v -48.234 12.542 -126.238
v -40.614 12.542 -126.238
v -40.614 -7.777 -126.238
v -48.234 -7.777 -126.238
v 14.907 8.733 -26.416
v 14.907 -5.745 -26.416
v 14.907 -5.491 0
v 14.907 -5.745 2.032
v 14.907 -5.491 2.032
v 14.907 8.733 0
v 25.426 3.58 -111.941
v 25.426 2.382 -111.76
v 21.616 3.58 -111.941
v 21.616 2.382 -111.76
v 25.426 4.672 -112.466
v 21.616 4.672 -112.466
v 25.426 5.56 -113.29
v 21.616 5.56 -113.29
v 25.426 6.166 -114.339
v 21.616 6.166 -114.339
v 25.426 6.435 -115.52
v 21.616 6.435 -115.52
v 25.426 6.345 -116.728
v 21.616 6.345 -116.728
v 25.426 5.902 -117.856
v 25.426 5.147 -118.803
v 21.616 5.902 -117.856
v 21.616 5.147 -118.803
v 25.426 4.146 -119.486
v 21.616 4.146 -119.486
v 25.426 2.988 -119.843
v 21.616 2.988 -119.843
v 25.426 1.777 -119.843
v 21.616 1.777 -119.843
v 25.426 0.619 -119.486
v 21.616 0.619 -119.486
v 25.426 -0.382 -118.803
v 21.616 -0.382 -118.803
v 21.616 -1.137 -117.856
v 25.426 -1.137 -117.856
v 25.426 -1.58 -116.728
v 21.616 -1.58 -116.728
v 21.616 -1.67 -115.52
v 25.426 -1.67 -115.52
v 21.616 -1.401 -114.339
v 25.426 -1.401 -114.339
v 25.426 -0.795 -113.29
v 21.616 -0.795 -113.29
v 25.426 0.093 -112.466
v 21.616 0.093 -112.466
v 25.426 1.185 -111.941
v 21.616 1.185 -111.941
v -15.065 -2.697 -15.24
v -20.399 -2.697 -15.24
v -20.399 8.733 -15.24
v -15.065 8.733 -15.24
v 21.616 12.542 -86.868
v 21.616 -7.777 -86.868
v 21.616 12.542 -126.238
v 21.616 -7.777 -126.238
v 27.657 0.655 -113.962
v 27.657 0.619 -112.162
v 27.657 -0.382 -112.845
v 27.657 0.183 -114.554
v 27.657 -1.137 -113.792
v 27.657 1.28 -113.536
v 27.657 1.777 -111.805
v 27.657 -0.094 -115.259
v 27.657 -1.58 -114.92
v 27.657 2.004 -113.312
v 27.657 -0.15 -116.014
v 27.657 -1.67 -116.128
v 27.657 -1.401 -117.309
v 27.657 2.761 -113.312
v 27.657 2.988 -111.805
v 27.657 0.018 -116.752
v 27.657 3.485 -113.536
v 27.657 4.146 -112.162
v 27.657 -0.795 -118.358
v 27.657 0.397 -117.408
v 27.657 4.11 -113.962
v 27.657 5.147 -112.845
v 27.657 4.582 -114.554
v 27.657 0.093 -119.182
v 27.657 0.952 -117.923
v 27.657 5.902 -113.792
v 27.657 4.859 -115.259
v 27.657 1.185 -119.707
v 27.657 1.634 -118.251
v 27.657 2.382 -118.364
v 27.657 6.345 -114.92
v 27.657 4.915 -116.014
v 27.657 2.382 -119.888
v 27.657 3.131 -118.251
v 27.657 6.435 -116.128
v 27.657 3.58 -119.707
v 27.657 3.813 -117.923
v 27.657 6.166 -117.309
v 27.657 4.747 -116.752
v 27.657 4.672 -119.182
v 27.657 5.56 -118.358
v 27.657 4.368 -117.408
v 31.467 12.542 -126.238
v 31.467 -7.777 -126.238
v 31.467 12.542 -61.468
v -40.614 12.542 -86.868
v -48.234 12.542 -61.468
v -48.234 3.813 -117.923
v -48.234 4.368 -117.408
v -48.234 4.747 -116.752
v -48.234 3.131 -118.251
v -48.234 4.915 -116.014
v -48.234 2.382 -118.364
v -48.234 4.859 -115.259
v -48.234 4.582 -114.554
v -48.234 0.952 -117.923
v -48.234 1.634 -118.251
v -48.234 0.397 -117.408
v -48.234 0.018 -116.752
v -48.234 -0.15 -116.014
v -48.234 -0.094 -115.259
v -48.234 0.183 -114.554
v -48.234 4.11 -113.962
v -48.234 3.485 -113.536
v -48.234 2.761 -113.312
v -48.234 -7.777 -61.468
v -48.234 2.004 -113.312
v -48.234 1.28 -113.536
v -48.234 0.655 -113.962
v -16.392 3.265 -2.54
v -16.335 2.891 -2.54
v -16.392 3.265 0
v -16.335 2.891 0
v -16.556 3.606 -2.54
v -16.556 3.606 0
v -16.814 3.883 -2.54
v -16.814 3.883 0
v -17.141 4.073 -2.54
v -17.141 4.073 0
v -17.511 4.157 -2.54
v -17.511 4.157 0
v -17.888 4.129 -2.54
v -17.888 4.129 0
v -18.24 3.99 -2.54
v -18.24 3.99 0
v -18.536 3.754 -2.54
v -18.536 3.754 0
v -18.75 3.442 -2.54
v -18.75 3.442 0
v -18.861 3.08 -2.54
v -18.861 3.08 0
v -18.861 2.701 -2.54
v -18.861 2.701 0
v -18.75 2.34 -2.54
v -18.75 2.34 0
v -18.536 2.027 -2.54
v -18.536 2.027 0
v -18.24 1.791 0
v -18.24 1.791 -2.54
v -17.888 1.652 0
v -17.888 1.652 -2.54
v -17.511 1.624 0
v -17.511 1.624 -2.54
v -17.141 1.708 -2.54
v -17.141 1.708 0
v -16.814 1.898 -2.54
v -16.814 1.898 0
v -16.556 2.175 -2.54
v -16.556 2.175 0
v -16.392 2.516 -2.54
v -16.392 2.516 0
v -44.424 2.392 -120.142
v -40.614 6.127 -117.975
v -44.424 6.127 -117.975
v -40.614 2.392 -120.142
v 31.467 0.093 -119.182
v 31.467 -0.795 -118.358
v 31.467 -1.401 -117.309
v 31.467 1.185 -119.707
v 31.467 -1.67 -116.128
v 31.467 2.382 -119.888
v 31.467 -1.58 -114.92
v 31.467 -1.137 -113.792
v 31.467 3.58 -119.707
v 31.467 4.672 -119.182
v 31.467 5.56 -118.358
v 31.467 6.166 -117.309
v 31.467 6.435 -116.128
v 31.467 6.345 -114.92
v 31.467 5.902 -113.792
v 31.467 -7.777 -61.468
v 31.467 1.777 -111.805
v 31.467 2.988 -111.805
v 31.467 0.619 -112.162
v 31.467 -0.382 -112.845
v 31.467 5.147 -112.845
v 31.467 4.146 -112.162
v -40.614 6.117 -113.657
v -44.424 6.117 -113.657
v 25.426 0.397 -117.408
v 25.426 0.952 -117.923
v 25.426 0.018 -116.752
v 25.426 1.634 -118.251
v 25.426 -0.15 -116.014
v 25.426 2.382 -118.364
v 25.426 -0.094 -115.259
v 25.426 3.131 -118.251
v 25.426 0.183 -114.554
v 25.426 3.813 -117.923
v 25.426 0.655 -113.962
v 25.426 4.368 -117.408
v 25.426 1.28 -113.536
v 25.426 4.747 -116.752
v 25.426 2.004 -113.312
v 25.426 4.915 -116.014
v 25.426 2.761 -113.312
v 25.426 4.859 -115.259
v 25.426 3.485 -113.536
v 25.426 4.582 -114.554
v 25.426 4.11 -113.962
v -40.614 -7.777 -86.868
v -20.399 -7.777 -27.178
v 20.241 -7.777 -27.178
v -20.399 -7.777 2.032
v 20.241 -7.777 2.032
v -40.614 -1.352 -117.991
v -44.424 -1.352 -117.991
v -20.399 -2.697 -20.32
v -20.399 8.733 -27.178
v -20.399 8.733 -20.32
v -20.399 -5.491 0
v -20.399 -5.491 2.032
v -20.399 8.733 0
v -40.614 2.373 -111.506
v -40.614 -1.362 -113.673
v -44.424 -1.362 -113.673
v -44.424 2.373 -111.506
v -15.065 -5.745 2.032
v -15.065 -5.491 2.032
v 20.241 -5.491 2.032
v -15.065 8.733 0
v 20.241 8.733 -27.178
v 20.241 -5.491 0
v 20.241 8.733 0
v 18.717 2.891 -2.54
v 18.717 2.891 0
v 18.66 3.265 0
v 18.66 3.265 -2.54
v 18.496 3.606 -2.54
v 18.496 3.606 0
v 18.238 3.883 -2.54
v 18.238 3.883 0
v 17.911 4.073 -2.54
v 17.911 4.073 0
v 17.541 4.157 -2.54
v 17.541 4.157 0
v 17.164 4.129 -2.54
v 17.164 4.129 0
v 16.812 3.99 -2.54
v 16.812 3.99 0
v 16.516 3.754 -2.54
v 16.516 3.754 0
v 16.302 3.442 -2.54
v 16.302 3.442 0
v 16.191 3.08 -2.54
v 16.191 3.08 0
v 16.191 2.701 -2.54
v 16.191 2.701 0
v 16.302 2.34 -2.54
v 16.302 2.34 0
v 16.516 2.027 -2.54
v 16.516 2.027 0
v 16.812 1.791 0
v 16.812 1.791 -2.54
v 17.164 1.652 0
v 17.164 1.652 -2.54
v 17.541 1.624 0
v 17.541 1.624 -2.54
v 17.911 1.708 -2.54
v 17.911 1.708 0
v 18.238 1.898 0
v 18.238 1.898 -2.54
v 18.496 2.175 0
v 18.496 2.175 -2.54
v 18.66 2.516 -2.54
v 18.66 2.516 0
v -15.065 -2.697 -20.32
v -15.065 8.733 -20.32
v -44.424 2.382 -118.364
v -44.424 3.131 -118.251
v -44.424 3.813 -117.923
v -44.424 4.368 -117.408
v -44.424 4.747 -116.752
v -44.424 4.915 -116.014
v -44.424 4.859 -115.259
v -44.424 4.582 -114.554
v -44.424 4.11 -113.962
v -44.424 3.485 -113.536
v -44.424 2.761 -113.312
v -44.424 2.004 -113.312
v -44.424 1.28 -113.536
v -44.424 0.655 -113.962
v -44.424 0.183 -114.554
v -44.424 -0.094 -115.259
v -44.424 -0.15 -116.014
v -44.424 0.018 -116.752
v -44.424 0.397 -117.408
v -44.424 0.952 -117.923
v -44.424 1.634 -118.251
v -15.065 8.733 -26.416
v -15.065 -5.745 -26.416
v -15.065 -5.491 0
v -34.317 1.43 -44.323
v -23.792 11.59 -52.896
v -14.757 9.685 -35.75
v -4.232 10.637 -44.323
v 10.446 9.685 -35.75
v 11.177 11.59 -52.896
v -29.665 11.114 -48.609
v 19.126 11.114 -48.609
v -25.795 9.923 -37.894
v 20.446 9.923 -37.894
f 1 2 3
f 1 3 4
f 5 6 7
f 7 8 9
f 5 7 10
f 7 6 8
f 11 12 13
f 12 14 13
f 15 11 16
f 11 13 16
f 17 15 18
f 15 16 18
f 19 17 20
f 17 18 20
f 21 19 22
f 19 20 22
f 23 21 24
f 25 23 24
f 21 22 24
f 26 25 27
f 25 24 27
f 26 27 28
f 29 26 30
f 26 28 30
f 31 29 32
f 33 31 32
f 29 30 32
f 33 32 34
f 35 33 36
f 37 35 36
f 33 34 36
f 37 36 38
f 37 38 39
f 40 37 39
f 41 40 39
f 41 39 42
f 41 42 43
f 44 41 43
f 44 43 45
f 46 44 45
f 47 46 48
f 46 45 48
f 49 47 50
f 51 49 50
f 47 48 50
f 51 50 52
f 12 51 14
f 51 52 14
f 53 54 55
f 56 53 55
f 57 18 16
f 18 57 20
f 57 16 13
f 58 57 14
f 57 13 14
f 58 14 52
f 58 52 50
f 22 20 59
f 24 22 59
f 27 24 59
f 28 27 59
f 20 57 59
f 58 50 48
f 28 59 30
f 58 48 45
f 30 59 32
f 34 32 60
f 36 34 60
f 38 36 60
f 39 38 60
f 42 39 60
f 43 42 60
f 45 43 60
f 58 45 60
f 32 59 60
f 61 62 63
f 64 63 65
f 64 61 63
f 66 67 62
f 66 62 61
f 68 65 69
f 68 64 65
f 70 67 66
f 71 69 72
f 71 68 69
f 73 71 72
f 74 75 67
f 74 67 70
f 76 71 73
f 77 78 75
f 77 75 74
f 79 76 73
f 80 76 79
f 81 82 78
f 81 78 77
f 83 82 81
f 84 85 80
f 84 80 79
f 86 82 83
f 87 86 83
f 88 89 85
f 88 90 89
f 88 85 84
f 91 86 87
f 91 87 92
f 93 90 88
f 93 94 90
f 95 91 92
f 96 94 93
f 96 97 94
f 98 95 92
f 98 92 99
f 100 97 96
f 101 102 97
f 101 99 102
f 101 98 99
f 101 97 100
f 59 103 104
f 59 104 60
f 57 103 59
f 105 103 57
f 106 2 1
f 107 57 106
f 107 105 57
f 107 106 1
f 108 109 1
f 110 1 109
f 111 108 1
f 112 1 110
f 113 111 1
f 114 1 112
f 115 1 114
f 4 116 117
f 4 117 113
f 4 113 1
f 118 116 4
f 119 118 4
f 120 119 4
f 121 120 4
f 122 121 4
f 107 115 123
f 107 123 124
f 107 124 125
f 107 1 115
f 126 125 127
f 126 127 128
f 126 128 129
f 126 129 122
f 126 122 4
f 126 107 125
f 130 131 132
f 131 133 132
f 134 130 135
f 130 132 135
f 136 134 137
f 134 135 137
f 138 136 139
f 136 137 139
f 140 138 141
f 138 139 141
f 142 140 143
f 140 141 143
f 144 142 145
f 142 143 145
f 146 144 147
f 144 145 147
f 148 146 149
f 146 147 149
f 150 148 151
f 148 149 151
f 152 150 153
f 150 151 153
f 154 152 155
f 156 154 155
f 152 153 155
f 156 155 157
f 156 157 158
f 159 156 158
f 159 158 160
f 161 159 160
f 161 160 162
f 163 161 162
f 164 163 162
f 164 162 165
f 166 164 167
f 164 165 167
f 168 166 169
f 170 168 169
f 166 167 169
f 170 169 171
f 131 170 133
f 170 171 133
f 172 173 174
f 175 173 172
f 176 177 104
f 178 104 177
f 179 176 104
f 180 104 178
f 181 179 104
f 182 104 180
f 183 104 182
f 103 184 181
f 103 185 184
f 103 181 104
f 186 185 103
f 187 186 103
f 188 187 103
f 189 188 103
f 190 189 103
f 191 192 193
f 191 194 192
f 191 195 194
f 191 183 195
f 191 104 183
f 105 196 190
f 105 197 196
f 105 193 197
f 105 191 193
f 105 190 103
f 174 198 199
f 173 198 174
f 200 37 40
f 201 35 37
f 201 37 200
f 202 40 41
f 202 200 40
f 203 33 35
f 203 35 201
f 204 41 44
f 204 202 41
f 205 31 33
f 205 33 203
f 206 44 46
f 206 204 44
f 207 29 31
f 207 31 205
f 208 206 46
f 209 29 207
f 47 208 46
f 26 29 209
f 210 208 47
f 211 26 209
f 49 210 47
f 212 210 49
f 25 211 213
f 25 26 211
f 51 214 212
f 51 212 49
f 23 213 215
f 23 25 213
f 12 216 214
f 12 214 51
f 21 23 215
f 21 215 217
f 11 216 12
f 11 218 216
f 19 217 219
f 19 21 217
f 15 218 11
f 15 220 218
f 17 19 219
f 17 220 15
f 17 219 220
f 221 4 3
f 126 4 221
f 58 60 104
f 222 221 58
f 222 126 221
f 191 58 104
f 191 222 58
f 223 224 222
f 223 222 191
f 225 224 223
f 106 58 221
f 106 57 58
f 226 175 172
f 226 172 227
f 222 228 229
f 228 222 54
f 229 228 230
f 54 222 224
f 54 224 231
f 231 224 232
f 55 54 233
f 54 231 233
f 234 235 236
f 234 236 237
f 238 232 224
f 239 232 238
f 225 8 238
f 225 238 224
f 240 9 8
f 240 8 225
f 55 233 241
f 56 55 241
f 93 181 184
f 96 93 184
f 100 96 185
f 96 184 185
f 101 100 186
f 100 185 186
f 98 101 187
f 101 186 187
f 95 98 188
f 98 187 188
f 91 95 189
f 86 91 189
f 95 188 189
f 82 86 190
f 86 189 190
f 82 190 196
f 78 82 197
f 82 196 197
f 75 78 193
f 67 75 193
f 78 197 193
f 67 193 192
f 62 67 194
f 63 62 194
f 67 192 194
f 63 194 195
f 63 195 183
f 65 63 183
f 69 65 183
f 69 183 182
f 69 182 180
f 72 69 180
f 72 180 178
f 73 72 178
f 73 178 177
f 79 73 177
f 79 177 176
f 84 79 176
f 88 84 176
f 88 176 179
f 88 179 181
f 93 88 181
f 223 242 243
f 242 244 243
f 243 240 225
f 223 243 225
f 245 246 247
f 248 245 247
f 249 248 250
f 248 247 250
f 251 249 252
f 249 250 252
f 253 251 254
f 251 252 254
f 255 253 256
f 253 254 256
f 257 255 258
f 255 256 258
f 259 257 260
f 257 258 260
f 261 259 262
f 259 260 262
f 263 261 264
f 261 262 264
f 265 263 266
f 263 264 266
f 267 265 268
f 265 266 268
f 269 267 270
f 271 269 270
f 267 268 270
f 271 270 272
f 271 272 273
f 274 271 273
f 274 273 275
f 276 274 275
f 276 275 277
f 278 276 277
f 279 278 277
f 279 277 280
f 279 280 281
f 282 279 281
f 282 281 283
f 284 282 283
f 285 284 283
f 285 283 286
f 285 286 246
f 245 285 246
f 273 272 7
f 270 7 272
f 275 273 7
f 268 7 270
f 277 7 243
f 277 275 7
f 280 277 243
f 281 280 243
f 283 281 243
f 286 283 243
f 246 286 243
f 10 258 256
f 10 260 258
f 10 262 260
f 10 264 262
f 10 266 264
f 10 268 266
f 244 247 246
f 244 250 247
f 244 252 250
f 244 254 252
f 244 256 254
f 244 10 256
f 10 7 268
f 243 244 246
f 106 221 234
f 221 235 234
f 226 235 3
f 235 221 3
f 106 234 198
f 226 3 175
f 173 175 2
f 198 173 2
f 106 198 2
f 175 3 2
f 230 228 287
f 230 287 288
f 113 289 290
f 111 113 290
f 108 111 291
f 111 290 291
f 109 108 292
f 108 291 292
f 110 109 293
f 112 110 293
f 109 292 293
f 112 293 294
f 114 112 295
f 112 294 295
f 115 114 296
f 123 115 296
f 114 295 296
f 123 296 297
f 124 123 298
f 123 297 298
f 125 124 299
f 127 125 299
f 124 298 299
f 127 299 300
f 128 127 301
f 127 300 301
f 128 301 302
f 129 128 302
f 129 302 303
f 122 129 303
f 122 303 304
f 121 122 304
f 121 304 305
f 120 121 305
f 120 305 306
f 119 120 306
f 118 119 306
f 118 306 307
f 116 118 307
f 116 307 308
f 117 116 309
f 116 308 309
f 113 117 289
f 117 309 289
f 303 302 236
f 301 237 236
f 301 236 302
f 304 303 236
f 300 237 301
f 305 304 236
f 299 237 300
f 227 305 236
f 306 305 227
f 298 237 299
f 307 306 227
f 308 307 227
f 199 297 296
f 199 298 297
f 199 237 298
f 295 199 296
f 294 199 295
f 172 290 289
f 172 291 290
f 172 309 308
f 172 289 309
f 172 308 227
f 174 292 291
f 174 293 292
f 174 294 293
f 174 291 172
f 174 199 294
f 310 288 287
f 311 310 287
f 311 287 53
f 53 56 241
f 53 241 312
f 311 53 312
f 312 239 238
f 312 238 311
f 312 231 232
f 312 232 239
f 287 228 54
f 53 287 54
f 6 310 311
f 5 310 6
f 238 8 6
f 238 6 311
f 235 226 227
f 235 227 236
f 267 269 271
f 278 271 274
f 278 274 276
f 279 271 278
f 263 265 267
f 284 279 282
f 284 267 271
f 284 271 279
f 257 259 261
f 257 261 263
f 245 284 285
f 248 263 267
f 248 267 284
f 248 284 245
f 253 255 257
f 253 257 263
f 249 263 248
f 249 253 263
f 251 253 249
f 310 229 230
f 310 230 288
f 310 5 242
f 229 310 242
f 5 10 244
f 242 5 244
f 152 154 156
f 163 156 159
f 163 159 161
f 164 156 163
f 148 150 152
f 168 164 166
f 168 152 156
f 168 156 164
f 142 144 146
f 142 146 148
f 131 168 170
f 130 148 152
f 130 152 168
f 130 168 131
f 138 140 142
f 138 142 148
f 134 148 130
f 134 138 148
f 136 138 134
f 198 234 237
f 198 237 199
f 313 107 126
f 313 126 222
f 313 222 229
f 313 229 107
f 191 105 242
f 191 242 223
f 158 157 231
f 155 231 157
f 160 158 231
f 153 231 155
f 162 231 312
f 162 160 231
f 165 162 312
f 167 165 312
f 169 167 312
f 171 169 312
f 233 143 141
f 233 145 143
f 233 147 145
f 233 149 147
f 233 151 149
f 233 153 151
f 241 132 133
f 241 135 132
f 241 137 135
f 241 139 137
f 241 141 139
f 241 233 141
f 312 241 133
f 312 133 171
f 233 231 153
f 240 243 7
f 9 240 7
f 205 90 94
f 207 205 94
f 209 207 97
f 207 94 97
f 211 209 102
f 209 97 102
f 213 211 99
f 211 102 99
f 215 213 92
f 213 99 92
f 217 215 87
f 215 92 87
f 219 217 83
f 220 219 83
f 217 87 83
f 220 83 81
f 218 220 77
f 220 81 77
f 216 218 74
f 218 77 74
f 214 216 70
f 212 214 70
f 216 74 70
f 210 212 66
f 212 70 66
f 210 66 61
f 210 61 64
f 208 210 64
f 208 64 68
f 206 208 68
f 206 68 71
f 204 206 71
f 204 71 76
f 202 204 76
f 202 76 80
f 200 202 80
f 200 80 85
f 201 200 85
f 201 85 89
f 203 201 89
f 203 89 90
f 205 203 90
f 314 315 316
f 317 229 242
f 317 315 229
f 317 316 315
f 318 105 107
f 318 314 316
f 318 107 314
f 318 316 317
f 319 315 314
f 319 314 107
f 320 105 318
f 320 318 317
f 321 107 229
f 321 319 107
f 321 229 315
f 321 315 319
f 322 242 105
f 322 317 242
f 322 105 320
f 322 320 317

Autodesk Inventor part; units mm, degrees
ref_plane "YZ Plane" through (0, 0, 0) normal (1, 0, 0) x (0, 1, 0)
sketch "Sketch1" plane through (0, 0, 0) normal (0, 0, 1) x (1, 0, 0)
  line L0 (-20.399473, 8.732571) -> (20.240527, 8.732571)
  line L1 (20.240527, 8.732571) -> (20.240527, -7.777429)
  line L2 (20.240527, -7.777429) -> (-20.399473, -7.777429)
  line L3 (-20.399473, -7.777429) -> (-20.399473, 8.732571)
  point P0 (0, 0)
  dimension "d0" = 40.64
  dimension "d1" = 16.51
extrude "Extrusion1" add sketch "Sketch1" against normal blind 27.178
sketch "Sketch2" plane through (0, 0, 0) normal (0, 0, 1) x (1, 0, 0)
  line L0 (20.240527, -7.777429) -> (-20.399473, -7.777429)
  line L1 (-20.399473, -7.777429) -> (-20.399473, -5.491429)
  line L2 (-20.399473, -7.777429) -> (-20.399473, 8.732571)
  line L3 (-20.399473, -5.491429) -> (-15.065473, -5.491429)
  line L4 (-15.065473, -5.491429) -> (-15.065473, -5.745429)
  line L5 (20.240527, -7.777429) -> (20.240527, -5.491429)
  line L6 (20.240527, 8.732571) -> (20.240527, -7.777429)
  line L7 (20.240527, -5.491429) -> (14.906527, -5.491429)
  line L8 (14.906527, -5.491429) -> (14.906527, -5.745429)
  line L9 (-15.065473, -5.745429) -> (14.906527, -5.745429)
  point P0 (0, 0)
  dimension "d4" = 2.286
  dimension "d5" = 5.334
  dimension "d6" = 0.254
  dimension "d7" = 2.286
  dimension "d8" = 5.334
  dimension "d9" = 0.254
extrude "Extrusion2" add sketch "Sketch2" along normal blind 2.032
sketch "Sketch3" plane through (0, 0, 0) normal (0, 0, 1) x (1, 0, 0)
  line L0 (-20.399473, 8.732571) -> (-20.399473, -5.491429)
  line L1 (20.240527, 8.732571) -> (-20.399473, 8.732571)
  line L2 (14.906527, -5.745429) -> (-15.065473, -5.745429)
  line L3 (-15.065473, 8.732571) -> (-15.065473, -5.745429)
  line L4 (-15.065473, -5.745429) -> (14.906527, -5.745429)
  line L5 (14.906527, -5.745429) -> (14.906527, 8.732571)
  line L6 (-15.065473, 8.732571) -> (14.906527, 8.732571)
  point P0 (0, 0)
  dimension "d12" = 5.334
extrude "Extrusion3" cut sketch "Sketch3" against normal blind 26.416
ref_plane "Work Plane1" through (0, 0, -61.468) normal (0, 0, -1) x (-1, 0, 0)
sketch "Sketch6" plane through (0, 0, -27.178) normal (0, 0, -1) x (-1, 0, 0)
  line L0 (20.399473, -7.777429) -> (-20.240527, -7.777429)
  point P0 (0, 0)
sketch "Sketch8" plane through (0, 0, -61.468) normal (0, 0, -1) x (-1, 0, 0)
  line L0 (0, 12.542354) -> (44.128566, 12.542354)
  line L1 (-20.240527, -7.777429) -> (20.399473, -7.777429)
  line L2 (0.079473, -7.777429) -> (44.128566, -7.777429)
  line L3 (-31.467332, 12.542354) -> (48.234468, 12.542354)
  line L4 (48.234468, 12.542354) -> (48.234468, -7.777429)
  line L5 (48.234468, -7.777429) -> (-31.467332, -7.777429)
  line L6 (-31.467332, -7.777429) -> (-31.467332, 12.542354)
  line L7 (-31.467332, 12.542354) -> (48.234468, 12.542354)
  line L8 (48.234468, 12.542354) -> (48.234468, -7.777429)
  line L9 (48.234468, -7.777429) -> (-31.467332, -7.777429)
  line L10 (-31.467332, -7.777429) -> (-31.467332, 12.542354)
  point P0 (0, 0)
sketch "Sketch8 outline for Loft1" plane through (0, 0, -61.468) normal (0, 0, -1) x (-1, 0, 0)
  line L0 (48.234468, 12.542354) -> (-31.467332, 12.542354)
  line L1 (48.234468, -7.777429) -> (48.234468, 12.542354)
  line L2 (-31.467332, -7.777429) -> (48.234468, -7.777429)
  line L3 (-31.467332, 12.542354) -> (-31.467332, -7.777429)
loft "Loft1" add profiles "Sketch8 outline for Loft1" section 1 edges at (-0.079473, -7.777429, -27.178) (-20.399473, 0.477571, -27.178) (-0.079473, 8.732571, -27.178) (20.240527, 0.477571, -27.178)
ref_plane "Work Plane2" through (31.467332, -7.777429, -126.238) normal (0, 0, -1) x (-1, 0, 0)
extrude "Extrusion4" add sketch "Sketch8" along normal blind 64.77
sketch "Sketch9" plane through (0, 0, -126.238) normal (0, 0, -1) x (-1, 0, 0)
  line L0 (40.614468, -7.777429) -> (40.614468, 12.542354)
  line L1 (-31.467332, 12.542354) -> (48.234468, 12.542354)
  line L2 (40.614468, 12.542354) -> (-21.615532, 12.542354)
  line L3 (-21.615532, 12.542354) -> (-21.615532, -7.777429)
  line L4 (-20.240527, -7.777429) -> (-31.467332, -7.777429)
  line L5 (-21.615532, -7.777429) -> (40.614468, -7.777429)
  point P0 (0, 0)
  point P1 (48.234468, -7.777429)
  dimension "d27" = 7.62
  dimension "d28" = 62.23
extrude "Extrusion5" cut sketch "Sketch9" against normal blind 39.37
sketch "Sketch10" plane through (21.615532, -7.777429, -126.238) normal (-1, 0, 0) x (0, 0, 1)
  point P0 (126.238, 7.777429)
sketch "Sketch11" plane through (31.467332, -7.777429, -61.468) normal (1, 0, 0) x (0, 0, -1)
  line L0 (64.77, 0) -> (64.77, 20.319783)
  line L1 (64.77, 10.159891) -> (54.356, 10.159891)
  circle A0 centre (54.356, 10.159891) radius 2.54
  circle A1 centre (54.356, 10.159891) radius 4.064
  point P0 (-61.468, 7.777429)
  dimension "d31" = 10.414
  dimension "d32" = 5.08
  dimension "d33" = 8.128
extrude "Extrusion6" cut sketch "Sketch11" against normal through all contours A0
sketch "Sketch12" plane through (-20.399473, -5.491429, 0) normal (-1, 0, 0) x (0, 0, 1)
  line L0 (-27.178, -2.286) -> (2.032, -2.286) projected
  line L1 (-20.32, -2.286) -> (-15.24, -2.286) construction
  line L2 (-20.32, 2.794) -> (-15.24, 2.794)
  line L3 (-15.24, 2.794) -> (-15.24, 14.224)
  line L4 (-20.32, 2.794) -> (-20.32, 14.224)
  line L5 (-20.32, 14.224) -> (-15.24, 14.224)
  point P0 (0, 5.491429)
  point P1 (-27.178, 14.224)
  dimension "d36" = 6.858
  dimension "d37" = 5.08
  dimension "d39" = 5.08
extrude "Extrusion7" cut sketch "Sketch12" against normal blind 25.4
sketch "Sketch13" plane through (0, 0, 0) normal (0, 0, 1) x (1, 0, 0)
  line L0 (-15.065473, -5.491429) -> (-20.399473, -5.491429)
  line L1 (-20.399473, -5.491429) -> (-17.605473, -5.491429)
  circle A0 centre (-17.605473, 2.890571) radius 1.27
  line L2 (20.240527, -5.491429) -> (14.906527, -5.491429)
  line L3 (20.240527, -5.491429) -> (17.446527, -5.491429)
  circle A1 centre (17.446527, 2.890571) radius 1.27
  point P0 (0, 0)
  dimension "d42" = 2.794
  dimension "d44" = 2.54
  dimension "d45" = 2.794
  dimension "d47" = 2.54
extrude "Extrusion8" cut sketch "Sketch13" against normal blind 2.54
sketch "Sketch15" plane through (31.467332, -7.777429, -61.468) normal (1, 0, 0) x (0, 0, -1)
  circle A0 centre (54.356, 10.159891) radius 2.54
  circle A1 centre (54.356, 10.159891) radius 4.064
  point P0 (-61.468, 7.777429)
  dimension "d51" = 8.128
extrude "Extrusion9" cut sketch "Sketch15" against normal blind 3.81 contours A0 | A1
sketch "Sketch16" plane through (21.615532, -7.777429, -126.238) normal (-1, 0, 0) x (0, 0, 1)
  point P0 (126.238, 7.777429)
sketch "Sketch17" plane through (21.615532, -7.777429, -126.238) normal (-1, 0, 0) x (0, 0, 1)
  circle A0 centre (10.414, 10.159891) radius 2.54
  circle A1 centre (10.414, 10.159891) radius 4.064
  point P0 (126.238, 7.777429)
  dimension "d54" = 8.128
extrude "Extrusion10" cut sketch "Sketch17" against normal blind 3.81 contours A0 | A1
sketch "Sketch18" plane through (-40.614468, -7.777429, -126.238) normal (1, 0, 0) x (0, 0, -1)
  circle A0 centre (-10.414, 10.159891) radius 2.54
  line L0 (-8.246516, 6.425305) -> (-12.564505, 6.415502)
  line L1 (-12.564505, 6.415502) -> (-14.731989, 10.150089)
  line L2 (-14.731989, 10.150089) -> (-12.581484, 13.894478)
  line L3 (-12.581484, 13.894478) -> (-8.263495, 13.904281)
  line L4 (-8.263495, 13.904281) -> (-6.096011, 10.169694)
  line L5 (-6.096011, 10.169694) -> (-8.246516, 6.425305)
  point P0 (-126.238, 7.777429)
extrude "Extrusion12" cut sketch "Sketch18" against normal blind 3.81
equation "\"d48\" = d47"
